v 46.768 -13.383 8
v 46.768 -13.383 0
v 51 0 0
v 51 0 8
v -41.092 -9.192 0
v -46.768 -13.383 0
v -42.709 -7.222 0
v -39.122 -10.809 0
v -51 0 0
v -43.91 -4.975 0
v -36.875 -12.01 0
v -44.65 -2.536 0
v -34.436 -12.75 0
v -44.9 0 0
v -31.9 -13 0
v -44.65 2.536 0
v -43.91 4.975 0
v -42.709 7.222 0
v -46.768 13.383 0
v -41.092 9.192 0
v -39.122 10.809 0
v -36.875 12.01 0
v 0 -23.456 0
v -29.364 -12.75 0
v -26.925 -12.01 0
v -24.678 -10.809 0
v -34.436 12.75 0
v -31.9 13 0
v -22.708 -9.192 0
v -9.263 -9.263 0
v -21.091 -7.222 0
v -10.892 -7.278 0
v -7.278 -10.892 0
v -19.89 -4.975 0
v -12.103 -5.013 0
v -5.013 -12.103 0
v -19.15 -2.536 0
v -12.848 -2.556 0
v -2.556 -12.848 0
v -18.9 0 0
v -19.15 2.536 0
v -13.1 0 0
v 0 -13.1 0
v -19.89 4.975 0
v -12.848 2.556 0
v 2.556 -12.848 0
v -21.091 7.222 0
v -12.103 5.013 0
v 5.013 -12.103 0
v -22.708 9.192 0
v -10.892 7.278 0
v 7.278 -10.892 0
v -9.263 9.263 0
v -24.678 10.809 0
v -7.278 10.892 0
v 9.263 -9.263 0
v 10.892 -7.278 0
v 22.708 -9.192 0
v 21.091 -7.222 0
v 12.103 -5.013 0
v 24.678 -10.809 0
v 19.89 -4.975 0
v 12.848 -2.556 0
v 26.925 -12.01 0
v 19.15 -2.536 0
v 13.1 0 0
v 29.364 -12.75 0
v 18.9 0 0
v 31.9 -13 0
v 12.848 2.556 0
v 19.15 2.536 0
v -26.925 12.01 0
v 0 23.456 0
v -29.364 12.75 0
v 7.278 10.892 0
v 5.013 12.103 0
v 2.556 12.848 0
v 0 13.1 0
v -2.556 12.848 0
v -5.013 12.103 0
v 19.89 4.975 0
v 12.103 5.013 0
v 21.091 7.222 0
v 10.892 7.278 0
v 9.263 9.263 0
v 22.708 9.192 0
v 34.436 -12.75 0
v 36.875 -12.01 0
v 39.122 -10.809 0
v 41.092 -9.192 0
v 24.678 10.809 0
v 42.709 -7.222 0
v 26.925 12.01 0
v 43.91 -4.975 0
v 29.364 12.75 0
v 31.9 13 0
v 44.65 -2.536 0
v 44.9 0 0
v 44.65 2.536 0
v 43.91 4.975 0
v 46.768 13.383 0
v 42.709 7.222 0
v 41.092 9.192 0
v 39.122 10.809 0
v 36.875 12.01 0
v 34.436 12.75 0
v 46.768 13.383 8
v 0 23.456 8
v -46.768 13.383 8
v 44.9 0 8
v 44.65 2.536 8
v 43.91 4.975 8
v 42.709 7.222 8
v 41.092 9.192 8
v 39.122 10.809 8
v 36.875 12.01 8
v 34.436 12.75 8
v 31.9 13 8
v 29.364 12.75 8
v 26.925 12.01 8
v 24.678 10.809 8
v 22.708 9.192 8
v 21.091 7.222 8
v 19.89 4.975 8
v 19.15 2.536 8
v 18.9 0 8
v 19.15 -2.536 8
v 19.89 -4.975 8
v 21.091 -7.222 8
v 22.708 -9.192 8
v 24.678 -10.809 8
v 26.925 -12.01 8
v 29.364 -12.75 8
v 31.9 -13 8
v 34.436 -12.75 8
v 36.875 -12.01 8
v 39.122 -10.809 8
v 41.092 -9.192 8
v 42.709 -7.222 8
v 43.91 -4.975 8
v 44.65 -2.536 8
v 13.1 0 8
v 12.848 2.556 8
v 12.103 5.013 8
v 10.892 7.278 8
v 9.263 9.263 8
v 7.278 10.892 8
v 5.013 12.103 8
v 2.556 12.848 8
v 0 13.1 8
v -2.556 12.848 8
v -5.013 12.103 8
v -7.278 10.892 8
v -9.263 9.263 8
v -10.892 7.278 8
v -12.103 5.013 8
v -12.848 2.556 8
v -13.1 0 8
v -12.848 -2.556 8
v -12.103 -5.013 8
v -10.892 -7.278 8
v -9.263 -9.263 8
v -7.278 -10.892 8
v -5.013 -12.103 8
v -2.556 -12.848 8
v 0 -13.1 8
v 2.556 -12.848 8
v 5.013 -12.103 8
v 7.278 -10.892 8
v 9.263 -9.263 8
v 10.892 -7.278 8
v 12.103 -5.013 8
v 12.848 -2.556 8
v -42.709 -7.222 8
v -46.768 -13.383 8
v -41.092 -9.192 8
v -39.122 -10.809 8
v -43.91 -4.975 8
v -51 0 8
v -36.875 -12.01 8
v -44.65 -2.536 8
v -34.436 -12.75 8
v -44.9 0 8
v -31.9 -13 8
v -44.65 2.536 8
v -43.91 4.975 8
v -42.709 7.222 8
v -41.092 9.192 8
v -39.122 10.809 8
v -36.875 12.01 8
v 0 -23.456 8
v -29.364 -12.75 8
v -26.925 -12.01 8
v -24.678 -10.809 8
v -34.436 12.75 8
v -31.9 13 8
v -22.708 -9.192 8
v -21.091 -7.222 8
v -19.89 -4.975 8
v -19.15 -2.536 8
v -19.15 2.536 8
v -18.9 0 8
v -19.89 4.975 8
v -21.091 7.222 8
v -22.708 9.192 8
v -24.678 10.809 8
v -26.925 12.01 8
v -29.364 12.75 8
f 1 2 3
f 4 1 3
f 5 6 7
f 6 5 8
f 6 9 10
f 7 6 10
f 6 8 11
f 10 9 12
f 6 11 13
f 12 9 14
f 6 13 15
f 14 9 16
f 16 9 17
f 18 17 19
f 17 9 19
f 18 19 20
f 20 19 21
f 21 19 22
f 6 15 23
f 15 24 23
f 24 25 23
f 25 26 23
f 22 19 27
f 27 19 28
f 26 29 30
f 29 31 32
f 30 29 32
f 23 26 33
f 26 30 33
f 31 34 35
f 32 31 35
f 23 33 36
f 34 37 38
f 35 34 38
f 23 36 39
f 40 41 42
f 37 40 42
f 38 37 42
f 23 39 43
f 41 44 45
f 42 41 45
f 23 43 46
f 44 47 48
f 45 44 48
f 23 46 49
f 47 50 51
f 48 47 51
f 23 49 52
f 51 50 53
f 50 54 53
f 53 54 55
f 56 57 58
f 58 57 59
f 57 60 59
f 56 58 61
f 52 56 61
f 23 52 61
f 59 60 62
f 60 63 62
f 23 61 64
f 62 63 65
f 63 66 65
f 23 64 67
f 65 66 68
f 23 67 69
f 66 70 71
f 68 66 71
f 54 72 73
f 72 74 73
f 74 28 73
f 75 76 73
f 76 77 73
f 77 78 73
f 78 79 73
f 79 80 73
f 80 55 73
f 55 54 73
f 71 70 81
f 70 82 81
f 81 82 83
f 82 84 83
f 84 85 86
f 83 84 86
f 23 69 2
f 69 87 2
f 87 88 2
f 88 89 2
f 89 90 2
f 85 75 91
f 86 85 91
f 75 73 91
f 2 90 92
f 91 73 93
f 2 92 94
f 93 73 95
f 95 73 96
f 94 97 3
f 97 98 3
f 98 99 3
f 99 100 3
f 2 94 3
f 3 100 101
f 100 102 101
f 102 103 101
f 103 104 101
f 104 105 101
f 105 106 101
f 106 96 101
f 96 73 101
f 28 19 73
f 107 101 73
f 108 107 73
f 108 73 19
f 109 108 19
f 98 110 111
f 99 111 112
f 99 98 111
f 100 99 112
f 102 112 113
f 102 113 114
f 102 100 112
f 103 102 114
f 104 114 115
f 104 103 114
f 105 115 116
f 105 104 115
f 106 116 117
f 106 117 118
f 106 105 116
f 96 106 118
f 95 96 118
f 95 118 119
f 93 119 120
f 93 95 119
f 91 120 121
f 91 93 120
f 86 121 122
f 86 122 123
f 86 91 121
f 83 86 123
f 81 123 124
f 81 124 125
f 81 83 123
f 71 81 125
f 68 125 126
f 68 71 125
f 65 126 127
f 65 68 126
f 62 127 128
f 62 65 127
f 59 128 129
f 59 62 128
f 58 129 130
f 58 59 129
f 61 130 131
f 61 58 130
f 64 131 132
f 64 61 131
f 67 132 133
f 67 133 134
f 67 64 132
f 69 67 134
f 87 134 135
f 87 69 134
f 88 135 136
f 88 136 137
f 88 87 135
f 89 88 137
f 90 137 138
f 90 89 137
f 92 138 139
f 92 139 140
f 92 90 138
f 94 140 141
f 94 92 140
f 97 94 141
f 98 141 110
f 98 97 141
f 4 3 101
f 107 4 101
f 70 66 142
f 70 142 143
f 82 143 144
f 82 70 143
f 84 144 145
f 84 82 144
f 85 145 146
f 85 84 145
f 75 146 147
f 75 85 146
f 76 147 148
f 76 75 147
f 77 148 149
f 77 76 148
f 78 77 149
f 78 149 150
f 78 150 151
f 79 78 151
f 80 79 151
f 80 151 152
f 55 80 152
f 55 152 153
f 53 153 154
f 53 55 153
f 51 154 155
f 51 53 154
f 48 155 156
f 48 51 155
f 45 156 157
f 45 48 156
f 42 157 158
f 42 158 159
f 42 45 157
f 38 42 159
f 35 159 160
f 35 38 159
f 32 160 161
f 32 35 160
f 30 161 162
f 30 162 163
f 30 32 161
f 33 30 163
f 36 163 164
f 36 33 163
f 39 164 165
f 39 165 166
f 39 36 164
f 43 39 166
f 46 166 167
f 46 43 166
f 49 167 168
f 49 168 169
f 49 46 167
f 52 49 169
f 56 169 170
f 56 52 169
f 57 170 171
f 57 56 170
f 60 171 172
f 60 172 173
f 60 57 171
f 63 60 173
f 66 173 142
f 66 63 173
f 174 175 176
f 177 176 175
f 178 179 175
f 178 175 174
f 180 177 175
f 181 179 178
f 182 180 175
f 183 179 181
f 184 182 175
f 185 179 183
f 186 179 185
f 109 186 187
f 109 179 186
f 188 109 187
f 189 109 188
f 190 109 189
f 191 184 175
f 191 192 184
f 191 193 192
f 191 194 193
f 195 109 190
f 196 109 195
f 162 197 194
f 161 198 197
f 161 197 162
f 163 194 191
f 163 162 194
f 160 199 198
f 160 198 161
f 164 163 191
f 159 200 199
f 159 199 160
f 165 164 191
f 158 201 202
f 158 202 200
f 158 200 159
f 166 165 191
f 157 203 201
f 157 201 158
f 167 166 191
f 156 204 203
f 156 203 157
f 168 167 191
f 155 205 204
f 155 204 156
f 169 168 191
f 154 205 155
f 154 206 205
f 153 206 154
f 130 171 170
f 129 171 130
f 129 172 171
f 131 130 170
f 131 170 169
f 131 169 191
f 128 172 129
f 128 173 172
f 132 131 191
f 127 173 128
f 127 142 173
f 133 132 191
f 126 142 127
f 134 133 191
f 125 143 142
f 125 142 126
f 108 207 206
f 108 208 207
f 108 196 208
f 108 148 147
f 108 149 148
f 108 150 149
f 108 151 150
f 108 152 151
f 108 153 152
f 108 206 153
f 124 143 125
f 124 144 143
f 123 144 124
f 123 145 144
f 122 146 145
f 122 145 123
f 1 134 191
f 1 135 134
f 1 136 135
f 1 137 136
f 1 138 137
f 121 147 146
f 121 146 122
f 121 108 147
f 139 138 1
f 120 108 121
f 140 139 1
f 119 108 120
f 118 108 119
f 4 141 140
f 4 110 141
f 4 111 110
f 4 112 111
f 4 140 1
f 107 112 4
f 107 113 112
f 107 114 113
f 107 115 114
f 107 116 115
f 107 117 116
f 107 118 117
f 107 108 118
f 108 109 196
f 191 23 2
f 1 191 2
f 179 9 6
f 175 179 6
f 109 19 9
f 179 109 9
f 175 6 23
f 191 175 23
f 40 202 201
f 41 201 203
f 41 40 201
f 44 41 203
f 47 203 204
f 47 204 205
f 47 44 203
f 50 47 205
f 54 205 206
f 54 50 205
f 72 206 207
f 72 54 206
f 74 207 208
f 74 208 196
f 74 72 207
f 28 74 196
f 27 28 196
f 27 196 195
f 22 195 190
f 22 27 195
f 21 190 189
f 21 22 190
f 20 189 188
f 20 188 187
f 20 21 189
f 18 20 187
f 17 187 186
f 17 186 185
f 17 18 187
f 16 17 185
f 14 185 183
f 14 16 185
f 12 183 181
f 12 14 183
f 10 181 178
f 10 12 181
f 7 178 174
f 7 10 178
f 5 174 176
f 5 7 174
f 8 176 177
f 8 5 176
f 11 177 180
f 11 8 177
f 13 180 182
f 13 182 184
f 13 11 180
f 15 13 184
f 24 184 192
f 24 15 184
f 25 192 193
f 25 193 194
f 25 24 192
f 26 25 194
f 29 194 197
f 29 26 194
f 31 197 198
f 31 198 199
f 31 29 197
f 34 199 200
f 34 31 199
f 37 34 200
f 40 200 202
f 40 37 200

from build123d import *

# Parameters (mm, degrees)
F0_R     = 13
F0_R_2   = 13.1
F1_DEPTH = 8


with BuildPart() as f1:
    # F0 (on Top) → F1 (new body)
    with BuildSketch(Plane.XY):
        Polygon((-46.768434, 13.382968), (-51, 0), (-46.768434, -13.382968), (0, -23.456169), (46.768434, -13.382968), (51, 0), (46.768434, 13.382968), (0, 23.456169), align=None)
        with Locations((-31.9, 0)):
            Circle(F0_R, mode=Mode.SUBTRACT)
        Circle(F0_R_2, mode=Mode.SUBTRACT)
        with Locations((31.9, 0)):
            Circle(F0_R, mode=Mode.SUBTRACT)
    extrude(amount=F1_DEPTH)


solid = f1.part
